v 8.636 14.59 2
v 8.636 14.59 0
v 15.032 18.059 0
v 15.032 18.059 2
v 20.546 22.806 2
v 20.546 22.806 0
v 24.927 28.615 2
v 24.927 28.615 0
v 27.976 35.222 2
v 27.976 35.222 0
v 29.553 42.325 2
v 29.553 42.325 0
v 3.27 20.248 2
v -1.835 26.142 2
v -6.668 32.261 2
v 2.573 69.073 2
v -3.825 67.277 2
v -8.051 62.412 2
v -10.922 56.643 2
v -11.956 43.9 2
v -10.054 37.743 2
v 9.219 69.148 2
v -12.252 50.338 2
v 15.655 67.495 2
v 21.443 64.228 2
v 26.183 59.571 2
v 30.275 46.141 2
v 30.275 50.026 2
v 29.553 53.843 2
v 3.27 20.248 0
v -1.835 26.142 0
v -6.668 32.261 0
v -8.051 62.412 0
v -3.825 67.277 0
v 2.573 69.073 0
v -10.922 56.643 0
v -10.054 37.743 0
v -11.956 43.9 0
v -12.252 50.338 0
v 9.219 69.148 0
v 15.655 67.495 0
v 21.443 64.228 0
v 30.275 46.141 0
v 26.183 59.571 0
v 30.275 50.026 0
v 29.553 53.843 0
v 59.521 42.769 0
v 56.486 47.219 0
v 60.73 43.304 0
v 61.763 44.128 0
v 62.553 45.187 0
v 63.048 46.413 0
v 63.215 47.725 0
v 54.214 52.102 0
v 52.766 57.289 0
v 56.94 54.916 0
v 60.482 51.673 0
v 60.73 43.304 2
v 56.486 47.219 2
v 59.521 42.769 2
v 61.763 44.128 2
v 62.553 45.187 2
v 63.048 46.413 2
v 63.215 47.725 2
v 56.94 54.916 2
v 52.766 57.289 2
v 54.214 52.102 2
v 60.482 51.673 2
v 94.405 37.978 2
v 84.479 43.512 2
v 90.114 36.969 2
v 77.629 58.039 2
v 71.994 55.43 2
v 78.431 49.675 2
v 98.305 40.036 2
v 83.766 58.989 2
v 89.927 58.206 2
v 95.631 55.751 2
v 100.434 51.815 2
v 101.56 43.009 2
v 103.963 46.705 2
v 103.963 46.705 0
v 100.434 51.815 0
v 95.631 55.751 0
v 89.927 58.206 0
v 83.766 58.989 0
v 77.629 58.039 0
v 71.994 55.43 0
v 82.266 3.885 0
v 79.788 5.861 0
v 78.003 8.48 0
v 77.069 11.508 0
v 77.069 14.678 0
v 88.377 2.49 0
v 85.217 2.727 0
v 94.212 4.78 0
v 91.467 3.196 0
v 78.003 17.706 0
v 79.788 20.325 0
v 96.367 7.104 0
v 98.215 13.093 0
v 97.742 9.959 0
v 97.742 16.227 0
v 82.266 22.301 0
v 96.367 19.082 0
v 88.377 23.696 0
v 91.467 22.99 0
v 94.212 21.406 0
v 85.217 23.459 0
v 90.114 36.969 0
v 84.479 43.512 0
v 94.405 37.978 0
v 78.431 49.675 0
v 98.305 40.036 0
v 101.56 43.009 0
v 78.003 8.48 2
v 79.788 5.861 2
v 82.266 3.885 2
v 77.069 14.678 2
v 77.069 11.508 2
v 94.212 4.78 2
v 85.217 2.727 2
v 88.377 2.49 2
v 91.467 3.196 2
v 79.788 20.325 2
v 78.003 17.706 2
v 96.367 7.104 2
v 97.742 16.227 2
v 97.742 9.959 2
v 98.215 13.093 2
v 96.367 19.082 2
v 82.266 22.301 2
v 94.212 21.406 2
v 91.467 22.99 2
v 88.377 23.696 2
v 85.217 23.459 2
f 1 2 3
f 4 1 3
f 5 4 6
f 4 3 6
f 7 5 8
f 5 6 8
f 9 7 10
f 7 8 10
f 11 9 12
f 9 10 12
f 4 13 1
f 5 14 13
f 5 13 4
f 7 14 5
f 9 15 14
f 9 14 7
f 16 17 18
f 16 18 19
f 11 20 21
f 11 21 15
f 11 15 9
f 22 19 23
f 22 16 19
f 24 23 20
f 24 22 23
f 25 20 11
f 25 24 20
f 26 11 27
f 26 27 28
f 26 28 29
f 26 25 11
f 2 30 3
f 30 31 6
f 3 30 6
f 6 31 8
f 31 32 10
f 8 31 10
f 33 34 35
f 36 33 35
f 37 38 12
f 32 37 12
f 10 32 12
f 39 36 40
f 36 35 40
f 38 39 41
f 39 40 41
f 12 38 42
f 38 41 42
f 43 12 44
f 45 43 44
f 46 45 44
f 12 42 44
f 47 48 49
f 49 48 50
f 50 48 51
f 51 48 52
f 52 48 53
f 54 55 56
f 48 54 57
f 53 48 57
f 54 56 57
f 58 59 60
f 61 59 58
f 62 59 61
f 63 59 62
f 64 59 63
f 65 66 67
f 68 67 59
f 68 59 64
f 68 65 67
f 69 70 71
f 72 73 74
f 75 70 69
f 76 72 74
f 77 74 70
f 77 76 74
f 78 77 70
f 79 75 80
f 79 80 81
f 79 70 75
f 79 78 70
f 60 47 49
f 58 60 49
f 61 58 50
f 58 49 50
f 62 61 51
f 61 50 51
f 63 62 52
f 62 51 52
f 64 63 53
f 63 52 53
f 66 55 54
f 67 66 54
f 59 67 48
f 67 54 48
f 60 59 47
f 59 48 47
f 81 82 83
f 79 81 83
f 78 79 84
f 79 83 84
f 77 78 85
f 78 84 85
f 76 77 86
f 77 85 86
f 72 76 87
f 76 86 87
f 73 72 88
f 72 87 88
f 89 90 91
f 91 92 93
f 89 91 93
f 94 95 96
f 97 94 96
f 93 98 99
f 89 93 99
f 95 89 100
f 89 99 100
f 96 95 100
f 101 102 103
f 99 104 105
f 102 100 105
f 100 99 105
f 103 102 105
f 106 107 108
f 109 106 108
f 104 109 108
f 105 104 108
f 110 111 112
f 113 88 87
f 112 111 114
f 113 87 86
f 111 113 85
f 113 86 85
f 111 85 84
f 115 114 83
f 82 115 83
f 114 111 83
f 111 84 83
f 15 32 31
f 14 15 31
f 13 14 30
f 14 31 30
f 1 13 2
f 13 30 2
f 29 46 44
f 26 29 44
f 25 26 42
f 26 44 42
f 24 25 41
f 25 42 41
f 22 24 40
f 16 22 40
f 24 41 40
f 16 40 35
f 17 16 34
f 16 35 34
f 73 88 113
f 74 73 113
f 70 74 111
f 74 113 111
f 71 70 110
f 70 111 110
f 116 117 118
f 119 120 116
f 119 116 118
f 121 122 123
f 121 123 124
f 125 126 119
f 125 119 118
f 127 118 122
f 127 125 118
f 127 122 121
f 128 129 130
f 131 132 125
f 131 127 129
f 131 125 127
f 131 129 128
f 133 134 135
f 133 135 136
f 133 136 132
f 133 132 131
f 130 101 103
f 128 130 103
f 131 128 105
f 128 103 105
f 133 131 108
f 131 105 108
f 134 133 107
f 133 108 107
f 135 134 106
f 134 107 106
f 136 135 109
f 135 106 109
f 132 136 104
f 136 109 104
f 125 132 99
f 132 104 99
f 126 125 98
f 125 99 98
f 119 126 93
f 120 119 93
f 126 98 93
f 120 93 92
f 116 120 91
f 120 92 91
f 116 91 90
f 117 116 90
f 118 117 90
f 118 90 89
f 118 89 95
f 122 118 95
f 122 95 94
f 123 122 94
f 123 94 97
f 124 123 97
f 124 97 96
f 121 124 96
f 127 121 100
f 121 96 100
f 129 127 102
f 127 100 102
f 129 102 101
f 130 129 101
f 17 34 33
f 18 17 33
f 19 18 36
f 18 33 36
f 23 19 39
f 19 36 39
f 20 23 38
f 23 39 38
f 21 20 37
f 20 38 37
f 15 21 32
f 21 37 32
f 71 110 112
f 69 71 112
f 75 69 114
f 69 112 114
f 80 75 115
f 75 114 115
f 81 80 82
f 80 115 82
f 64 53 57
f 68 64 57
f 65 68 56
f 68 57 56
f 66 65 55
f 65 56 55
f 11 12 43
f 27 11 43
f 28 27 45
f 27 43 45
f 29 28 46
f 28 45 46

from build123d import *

# Parameters (mm, degrees)
F0_R     = 10.632353
F1_DEPTH = 2


with BuildPart() as f1:
    # F0 (on Top) → F1 (new body)
    with BuildSketch(Plane.XY):
        with BuildLine():
            ThreePointArc((29.552962, 53.842974), (15.655491, 67.495194), (-3.824626, 67.276505))
            ThreePointArc((-3.824626, 67.276505), (-12.251634, 50.337547), (-6.66779, 32.260948))
            ThreePointArc((-6.66779, 32.260948), (0.684435, 23.166075), (8.636001, 14.590264))
            ThreePointArc((8.636001, 14.590264), (22.892183, 25.593234), (29.552962, 42.324585))
            ThreePointArc((29.552962, 42.324585), (30.365814, 48.083779), (29.552962, 53.842974))
        make_face()
        with BuildLine():
            ThreePointArc((90.113752, 36.969028), (98.304724, 40.035854), (103.962928, 46.705348))
            ThreePointArc((103.962928, 46.705348), (89.926552, 58.206193), (71.993783, 55.430396))
            ThreePointArc((71.993783, 55.430396), (81.505382, 46.642975), (90.113752, 36.969028))
        make_face()
        with Locations((87.582447, 13.093072)):
            Circle(F0_R)
        with BuildLine():
            ThreePointArc((63.214978, 47.724526), (58.802262, 53.393765), (52.765941, 57.289295))
            ThreePointArc((52.765941, 57.289295), (55.249966, 49.613752), (59.520704, 42.769402))
            ThreePointArc((59.520704, 42.769402), (62.192468, 44.632166), (63.214978, 47.724526))
        make_face()
    extrude(amount=F1_DEPTH)


solid = f1.part
